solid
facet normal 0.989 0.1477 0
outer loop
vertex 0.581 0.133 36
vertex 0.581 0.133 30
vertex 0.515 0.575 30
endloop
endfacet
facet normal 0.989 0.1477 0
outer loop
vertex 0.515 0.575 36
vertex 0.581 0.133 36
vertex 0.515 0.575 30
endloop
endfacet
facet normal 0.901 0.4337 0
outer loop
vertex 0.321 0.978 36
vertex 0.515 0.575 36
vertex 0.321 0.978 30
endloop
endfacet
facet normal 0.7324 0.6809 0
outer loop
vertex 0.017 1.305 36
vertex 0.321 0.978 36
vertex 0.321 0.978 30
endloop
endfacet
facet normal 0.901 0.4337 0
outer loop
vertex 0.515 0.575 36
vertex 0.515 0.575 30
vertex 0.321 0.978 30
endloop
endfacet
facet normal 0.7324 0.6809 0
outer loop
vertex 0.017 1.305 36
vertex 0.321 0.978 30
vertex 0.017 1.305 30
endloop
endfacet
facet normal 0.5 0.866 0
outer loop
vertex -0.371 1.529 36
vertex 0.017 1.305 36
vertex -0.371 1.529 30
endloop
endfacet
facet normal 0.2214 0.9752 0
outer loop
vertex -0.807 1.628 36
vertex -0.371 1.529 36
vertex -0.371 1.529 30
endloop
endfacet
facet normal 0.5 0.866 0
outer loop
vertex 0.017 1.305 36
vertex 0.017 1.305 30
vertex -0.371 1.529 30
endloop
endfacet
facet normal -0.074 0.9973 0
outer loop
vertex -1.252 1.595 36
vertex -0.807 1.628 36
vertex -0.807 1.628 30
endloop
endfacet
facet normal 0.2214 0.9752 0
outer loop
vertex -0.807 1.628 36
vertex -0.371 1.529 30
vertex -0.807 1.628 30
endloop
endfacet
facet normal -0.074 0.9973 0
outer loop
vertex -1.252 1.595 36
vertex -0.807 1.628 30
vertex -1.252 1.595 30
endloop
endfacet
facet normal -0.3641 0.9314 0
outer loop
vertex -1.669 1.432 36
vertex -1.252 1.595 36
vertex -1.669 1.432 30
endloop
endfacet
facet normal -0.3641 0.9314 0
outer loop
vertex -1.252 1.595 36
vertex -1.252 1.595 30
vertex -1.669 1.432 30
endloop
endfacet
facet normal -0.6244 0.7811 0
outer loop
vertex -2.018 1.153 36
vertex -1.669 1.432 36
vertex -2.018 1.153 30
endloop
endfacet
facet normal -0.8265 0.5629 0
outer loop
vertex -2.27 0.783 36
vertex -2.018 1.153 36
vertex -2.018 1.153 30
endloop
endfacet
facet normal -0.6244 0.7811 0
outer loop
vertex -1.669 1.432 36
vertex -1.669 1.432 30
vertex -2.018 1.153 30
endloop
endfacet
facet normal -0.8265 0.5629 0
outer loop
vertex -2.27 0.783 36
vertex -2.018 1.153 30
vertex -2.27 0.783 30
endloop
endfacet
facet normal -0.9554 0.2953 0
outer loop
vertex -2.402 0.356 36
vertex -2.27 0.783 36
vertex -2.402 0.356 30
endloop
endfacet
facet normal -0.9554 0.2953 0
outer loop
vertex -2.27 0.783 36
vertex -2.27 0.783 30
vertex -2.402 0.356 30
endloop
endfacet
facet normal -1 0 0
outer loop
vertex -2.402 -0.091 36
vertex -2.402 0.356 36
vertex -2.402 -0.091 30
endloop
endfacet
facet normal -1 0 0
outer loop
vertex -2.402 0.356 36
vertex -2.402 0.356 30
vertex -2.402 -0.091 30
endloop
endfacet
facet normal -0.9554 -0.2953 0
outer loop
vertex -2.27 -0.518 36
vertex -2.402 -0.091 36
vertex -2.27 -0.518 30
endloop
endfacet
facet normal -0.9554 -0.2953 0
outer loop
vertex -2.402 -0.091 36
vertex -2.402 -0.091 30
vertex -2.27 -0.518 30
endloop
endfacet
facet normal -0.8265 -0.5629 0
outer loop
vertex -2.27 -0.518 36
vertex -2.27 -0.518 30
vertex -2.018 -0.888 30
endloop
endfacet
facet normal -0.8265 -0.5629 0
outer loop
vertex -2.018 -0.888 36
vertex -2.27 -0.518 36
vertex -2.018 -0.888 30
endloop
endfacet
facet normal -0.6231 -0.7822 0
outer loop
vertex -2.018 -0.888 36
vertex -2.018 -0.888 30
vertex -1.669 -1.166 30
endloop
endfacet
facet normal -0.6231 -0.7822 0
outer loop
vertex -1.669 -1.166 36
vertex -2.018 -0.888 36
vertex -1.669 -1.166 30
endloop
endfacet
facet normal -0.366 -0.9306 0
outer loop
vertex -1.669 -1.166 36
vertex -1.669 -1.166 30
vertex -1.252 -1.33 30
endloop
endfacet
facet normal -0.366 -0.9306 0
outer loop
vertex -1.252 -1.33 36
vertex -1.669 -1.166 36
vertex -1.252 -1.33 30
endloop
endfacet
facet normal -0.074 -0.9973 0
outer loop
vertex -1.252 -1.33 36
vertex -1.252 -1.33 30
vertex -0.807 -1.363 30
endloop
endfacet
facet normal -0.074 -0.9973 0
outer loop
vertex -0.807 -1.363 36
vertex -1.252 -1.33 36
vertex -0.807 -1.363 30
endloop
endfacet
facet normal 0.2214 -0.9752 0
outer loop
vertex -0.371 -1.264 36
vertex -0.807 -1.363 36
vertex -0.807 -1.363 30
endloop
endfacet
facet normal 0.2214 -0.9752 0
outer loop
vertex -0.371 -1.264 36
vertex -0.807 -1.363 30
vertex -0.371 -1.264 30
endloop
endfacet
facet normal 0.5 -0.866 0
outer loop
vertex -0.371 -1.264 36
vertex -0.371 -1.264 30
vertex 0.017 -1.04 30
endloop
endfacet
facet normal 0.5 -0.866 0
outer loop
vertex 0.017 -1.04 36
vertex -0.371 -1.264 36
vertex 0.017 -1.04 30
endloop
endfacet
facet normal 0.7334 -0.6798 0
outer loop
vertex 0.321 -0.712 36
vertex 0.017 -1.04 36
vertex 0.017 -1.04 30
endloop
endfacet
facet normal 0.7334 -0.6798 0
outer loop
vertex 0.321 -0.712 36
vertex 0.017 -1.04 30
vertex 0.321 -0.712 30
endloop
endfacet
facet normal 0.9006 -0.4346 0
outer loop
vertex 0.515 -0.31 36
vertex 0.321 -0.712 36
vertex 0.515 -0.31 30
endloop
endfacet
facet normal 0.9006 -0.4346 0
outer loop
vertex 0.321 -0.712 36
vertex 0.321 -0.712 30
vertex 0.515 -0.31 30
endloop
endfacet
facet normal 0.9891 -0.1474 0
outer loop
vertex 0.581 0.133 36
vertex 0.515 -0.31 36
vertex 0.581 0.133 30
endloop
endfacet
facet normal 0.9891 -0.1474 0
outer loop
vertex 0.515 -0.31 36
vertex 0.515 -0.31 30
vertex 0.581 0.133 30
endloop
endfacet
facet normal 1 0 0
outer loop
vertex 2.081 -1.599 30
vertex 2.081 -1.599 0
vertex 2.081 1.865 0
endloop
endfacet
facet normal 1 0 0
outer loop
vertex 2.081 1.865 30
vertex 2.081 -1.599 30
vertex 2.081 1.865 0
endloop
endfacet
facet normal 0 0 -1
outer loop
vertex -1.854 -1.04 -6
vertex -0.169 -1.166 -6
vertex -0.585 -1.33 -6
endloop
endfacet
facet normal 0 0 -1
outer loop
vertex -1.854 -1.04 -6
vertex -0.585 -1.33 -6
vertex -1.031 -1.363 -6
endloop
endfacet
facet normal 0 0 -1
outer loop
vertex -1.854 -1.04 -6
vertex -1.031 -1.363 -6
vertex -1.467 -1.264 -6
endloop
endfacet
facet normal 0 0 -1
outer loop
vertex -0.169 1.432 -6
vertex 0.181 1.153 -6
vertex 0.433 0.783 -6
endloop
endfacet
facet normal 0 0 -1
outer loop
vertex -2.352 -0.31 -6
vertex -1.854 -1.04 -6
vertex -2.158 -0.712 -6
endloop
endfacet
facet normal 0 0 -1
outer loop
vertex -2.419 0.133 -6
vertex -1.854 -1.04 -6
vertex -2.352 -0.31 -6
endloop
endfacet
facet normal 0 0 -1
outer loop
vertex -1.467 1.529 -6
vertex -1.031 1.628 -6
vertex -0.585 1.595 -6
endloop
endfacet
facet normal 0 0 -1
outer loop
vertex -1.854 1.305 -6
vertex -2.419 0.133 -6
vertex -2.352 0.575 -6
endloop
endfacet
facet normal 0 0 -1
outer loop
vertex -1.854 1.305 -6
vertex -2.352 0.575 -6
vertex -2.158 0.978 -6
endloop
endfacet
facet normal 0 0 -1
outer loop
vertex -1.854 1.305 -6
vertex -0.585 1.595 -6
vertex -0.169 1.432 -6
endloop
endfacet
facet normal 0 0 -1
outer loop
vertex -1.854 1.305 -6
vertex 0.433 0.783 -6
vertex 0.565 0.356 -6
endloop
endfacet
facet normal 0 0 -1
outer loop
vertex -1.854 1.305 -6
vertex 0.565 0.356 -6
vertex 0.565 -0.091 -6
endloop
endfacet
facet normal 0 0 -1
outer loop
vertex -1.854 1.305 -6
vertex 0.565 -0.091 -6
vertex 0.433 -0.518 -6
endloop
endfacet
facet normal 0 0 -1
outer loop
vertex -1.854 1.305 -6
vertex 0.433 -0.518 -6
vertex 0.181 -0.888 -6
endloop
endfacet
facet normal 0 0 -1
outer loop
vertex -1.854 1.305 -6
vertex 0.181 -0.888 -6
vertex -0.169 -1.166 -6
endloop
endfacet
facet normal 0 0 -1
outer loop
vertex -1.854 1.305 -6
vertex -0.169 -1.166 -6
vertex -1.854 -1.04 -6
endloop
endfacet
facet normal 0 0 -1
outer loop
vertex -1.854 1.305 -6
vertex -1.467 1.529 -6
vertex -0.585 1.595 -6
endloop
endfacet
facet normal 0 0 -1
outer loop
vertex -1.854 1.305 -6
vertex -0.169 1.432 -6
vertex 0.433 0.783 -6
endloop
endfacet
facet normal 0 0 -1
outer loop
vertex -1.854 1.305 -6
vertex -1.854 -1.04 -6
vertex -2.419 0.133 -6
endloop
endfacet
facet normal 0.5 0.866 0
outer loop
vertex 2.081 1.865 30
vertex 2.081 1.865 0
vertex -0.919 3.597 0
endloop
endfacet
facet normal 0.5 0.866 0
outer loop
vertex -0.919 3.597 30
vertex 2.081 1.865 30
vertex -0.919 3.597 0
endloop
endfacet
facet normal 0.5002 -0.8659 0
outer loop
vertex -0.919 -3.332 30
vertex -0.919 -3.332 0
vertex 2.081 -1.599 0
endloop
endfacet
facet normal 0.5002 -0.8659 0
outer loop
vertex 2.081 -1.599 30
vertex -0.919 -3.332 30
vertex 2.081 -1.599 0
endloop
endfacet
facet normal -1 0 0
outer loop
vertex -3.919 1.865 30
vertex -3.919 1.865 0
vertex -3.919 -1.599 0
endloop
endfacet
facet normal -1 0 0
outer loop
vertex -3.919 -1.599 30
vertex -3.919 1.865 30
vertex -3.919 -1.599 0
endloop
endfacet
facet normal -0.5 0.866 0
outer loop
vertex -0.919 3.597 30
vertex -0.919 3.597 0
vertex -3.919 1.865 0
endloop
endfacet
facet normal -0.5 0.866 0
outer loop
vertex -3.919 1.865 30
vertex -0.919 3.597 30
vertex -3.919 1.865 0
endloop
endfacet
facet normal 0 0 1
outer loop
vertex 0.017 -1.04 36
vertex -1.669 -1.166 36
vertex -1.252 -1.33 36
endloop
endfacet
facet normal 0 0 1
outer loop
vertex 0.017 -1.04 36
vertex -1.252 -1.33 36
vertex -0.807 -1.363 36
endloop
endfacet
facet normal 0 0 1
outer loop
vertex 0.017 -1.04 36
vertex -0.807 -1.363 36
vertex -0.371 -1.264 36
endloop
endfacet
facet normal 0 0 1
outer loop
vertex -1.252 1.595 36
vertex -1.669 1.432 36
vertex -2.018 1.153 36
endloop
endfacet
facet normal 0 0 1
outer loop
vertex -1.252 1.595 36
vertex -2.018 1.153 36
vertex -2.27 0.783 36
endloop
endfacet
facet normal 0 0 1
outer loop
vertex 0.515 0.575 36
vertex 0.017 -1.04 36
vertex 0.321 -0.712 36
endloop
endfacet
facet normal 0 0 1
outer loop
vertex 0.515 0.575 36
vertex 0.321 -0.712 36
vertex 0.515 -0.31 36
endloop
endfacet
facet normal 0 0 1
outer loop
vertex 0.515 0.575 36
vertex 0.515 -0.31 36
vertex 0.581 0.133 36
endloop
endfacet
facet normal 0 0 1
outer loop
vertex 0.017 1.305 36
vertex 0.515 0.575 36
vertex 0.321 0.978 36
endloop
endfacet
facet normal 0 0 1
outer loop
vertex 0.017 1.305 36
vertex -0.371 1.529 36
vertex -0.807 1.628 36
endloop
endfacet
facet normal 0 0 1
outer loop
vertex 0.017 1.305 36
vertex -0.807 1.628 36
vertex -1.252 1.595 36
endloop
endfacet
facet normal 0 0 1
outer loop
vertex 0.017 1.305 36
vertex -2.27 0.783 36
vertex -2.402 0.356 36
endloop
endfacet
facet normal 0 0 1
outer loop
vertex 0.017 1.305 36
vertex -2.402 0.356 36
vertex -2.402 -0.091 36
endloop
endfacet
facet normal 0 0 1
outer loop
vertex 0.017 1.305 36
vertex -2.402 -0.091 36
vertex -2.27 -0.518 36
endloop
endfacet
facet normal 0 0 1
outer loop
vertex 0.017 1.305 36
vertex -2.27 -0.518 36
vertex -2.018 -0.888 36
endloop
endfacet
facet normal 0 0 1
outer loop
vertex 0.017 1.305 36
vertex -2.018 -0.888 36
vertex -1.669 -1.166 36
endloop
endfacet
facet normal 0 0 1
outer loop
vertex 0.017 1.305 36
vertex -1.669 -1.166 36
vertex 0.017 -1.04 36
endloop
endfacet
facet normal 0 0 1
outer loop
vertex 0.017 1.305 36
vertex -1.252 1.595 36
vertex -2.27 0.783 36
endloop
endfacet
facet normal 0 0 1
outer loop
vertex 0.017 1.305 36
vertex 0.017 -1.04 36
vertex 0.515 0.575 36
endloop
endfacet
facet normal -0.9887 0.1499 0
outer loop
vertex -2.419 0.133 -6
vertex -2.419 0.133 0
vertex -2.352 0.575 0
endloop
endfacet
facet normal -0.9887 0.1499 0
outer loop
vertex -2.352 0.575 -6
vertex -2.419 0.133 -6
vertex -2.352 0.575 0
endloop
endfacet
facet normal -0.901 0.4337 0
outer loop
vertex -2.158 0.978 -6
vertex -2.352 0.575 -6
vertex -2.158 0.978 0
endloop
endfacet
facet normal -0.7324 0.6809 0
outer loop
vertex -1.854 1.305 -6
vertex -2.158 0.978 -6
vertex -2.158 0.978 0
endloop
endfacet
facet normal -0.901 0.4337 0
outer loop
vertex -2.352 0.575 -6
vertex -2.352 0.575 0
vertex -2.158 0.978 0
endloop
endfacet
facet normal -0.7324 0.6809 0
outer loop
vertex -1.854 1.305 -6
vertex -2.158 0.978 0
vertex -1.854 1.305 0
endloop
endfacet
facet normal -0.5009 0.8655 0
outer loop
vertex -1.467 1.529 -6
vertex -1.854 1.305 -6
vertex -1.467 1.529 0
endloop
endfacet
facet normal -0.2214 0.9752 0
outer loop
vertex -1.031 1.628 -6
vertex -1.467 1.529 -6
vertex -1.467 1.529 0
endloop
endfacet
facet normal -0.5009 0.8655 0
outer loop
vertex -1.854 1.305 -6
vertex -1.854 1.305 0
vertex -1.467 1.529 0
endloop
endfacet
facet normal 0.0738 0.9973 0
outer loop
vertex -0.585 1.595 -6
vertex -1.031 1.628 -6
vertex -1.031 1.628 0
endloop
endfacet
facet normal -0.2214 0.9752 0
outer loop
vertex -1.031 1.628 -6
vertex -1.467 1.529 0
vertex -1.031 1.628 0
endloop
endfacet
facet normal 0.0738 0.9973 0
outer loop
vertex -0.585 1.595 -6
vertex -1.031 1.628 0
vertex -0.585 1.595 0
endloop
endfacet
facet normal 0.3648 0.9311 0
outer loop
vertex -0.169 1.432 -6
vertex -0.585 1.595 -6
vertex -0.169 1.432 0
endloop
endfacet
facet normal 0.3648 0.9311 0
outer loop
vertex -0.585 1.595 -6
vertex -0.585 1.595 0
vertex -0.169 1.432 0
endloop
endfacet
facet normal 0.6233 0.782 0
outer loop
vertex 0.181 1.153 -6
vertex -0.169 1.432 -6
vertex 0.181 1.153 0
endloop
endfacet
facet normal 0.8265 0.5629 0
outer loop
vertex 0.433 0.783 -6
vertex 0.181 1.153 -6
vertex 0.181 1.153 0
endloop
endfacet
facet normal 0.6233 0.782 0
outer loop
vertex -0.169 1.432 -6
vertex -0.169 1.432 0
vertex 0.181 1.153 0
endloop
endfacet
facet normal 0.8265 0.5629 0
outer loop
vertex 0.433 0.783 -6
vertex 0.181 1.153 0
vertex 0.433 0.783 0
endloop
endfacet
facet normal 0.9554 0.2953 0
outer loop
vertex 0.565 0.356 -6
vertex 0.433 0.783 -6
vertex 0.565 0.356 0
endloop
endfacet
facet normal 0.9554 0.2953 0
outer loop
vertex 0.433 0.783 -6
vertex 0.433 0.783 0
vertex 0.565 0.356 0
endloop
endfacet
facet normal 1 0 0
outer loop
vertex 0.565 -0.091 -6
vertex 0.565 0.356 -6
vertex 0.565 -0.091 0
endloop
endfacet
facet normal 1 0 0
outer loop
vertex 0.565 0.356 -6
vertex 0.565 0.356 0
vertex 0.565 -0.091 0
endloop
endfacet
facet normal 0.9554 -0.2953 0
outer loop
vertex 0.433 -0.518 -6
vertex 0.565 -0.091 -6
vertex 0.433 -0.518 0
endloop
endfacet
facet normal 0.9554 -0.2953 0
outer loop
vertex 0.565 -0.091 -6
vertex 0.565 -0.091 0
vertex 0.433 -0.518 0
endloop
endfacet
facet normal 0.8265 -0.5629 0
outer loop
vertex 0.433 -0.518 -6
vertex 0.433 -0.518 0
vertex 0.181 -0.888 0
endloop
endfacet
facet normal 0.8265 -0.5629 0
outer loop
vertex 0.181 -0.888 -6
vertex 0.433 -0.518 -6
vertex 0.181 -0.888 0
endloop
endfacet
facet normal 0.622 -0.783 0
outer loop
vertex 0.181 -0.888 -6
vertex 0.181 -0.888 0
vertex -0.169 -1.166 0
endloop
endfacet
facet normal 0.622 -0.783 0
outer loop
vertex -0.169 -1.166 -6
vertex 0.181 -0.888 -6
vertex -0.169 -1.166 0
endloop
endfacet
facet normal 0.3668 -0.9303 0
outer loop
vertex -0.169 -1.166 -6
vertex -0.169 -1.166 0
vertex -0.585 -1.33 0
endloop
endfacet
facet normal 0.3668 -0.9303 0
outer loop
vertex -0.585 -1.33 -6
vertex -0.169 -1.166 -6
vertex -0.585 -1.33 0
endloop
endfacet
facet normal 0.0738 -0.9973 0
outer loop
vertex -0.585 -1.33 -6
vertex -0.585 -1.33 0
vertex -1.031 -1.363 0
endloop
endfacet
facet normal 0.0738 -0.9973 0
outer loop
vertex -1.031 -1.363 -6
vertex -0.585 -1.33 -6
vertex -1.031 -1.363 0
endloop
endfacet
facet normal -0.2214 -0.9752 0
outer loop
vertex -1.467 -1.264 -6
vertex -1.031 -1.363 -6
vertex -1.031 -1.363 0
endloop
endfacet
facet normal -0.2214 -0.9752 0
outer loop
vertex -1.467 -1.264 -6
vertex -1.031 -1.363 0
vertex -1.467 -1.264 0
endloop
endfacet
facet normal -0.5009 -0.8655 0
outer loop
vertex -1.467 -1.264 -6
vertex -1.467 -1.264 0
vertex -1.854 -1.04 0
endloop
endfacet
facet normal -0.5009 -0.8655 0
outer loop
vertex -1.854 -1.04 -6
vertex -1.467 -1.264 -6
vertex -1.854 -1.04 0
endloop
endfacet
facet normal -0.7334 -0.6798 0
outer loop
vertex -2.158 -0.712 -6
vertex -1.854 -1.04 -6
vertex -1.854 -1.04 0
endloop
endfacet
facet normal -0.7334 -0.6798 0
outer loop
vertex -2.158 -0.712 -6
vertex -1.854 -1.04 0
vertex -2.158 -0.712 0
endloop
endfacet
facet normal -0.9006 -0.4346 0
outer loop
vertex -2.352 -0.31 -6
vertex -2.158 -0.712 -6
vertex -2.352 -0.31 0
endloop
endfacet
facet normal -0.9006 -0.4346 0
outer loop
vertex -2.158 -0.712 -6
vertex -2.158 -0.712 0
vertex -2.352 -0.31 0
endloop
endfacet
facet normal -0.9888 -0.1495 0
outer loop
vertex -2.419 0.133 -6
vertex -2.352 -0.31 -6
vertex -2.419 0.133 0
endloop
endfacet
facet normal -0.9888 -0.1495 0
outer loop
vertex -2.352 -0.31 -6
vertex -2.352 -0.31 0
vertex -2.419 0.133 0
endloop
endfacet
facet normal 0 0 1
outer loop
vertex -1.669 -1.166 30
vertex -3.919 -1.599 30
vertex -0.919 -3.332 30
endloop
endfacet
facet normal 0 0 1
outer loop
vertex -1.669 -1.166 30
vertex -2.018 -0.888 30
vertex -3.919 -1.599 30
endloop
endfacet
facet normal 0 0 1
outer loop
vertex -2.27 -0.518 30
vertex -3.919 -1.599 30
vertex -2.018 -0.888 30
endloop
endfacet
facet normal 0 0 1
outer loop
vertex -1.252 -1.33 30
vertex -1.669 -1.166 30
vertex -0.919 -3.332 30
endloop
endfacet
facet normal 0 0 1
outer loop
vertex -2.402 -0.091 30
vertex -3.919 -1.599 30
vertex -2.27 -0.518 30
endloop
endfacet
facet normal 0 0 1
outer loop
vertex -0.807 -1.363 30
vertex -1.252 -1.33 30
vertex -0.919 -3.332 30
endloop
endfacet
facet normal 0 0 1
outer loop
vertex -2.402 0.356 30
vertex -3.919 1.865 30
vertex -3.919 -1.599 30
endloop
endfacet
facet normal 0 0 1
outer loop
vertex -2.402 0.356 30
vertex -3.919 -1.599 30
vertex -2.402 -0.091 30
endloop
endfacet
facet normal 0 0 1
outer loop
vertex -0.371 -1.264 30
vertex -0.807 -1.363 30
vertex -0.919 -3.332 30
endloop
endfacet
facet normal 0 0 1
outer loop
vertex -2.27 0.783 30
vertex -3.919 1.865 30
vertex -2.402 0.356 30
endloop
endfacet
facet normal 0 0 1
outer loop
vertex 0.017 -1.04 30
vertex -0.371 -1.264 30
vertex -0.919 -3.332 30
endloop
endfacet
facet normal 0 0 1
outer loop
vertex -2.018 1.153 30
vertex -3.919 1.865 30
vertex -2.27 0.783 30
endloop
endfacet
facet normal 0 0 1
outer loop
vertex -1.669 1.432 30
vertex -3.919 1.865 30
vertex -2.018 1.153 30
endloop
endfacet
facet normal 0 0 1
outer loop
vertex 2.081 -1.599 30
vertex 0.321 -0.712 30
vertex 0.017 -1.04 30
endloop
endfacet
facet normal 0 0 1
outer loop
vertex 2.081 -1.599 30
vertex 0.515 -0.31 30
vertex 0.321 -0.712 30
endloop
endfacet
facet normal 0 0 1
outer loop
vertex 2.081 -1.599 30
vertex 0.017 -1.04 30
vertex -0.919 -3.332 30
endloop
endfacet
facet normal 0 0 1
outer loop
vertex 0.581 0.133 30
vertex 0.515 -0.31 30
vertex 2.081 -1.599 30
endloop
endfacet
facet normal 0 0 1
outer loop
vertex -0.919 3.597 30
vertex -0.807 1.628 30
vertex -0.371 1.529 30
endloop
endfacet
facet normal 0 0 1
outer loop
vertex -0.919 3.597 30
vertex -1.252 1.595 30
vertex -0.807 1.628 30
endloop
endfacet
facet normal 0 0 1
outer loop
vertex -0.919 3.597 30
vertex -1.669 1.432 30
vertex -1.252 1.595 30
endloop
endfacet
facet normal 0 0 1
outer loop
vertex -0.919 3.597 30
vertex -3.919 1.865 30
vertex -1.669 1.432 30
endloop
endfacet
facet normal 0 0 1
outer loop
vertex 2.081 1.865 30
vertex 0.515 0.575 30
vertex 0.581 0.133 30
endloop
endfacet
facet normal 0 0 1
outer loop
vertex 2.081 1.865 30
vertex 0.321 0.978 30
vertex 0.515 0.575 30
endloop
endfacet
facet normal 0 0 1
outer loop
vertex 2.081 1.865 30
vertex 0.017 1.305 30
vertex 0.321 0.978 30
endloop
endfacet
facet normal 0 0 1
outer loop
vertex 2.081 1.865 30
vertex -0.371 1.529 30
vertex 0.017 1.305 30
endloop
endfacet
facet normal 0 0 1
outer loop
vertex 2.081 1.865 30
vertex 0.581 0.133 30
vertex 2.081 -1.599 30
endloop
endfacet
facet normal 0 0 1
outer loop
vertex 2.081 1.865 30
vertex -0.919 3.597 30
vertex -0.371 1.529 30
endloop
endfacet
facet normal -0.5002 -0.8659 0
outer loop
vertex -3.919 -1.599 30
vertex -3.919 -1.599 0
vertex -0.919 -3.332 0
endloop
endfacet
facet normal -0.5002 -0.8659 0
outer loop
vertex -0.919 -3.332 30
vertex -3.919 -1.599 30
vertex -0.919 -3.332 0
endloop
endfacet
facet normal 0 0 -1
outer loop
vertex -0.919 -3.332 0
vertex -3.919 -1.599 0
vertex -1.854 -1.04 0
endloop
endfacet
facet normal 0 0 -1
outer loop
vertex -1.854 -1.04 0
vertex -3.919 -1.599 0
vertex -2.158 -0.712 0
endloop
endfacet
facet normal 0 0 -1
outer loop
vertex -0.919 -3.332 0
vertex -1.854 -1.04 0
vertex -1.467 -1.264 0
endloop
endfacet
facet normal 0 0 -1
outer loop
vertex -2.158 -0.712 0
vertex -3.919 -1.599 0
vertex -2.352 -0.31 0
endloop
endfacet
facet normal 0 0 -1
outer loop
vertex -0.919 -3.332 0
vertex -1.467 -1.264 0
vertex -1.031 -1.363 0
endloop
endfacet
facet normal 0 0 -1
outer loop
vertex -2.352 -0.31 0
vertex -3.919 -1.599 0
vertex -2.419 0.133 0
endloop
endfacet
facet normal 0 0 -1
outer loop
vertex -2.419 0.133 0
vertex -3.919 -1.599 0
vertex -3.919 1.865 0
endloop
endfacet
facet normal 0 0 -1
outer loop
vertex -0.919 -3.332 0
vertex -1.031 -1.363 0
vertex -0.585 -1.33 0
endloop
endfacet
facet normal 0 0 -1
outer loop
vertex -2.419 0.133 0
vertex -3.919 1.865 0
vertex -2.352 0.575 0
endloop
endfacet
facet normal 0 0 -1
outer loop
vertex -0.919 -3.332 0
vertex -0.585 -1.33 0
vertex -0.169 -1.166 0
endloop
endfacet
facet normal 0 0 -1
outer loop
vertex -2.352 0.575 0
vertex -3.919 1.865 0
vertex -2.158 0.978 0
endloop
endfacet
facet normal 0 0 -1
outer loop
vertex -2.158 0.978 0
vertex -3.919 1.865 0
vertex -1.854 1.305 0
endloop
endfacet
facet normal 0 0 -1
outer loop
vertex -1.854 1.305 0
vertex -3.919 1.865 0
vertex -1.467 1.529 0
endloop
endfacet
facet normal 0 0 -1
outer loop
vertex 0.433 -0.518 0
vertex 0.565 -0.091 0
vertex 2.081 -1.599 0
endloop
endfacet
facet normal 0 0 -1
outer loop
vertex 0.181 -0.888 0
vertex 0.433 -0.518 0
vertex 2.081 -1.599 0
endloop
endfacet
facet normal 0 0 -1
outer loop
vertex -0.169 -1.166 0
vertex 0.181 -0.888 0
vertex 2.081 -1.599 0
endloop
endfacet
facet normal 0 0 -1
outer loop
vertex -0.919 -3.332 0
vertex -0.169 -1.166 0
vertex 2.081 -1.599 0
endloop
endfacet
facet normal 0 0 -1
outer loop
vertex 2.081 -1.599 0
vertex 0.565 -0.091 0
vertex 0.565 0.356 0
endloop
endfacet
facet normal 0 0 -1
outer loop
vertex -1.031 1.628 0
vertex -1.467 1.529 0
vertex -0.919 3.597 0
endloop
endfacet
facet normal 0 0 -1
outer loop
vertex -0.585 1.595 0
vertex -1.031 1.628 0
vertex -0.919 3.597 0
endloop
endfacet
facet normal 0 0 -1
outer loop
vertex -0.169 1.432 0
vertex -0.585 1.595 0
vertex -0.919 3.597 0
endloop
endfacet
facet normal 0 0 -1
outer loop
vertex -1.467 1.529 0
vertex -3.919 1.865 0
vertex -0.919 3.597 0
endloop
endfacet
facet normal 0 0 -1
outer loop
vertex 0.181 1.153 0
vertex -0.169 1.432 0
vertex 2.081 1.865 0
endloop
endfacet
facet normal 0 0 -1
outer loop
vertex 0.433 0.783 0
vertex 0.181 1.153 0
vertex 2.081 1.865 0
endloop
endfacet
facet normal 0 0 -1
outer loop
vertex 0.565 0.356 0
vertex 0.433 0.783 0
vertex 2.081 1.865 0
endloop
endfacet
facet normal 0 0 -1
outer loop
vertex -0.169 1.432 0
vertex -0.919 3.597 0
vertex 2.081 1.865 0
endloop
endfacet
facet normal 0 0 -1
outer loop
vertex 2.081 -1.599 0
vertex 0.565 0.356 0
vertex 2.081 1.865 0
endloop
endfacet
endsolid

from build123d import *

# Parameters (mm, degrees)
BOSS_EXTRUDE1_DEPTH = 30
SKETCH2_R           = 1.5
BOSS_EXTRUDE2_DEPTH = 6
SKETCH3_R           = 1.5
BOSS_EXTRUDE3_DEPTH = 6


with BuildPart() as part:
    # Sketch1 → Boss-Extrude1 (new body)
    with BuildSketch(Plane.XY):
        Polygon((-0.918598934, -3.331524887), (2.081401066, -1.599474079), (2.081401066, 1.864627536), (-0.918598934, 3.596678344), (-3.918598934, 1.864627536), (-3.918598934, -1.599474079), align=None)
    extrude(amount=BOSS_EXTRUDE1_DEPTH)

    # Sketch2 → Boss-Extrude2 (add)
    with BuildSketch(Plane.XY.offset(30)):
        with Locations((-0.918598934, 0.132576728)):
            Circle(SKETCH2_R)
    extrude(amount=BOSS_EXTRUDE2_DEPTH)

    # Sketch3 → Boss-Extrude3 (add)
    with BuildSketch(Plane(origin=(0, 0, 0), x_dir=(-1, 0, 0), z_dir=(0, 0, -1))):
        with Locations((0.918598934, 0.132576728)):
            Circle(SKETCH3_R)
    extrude(amount=BOSS_EXTRUDE3_DEPTH)


solid = part.part
